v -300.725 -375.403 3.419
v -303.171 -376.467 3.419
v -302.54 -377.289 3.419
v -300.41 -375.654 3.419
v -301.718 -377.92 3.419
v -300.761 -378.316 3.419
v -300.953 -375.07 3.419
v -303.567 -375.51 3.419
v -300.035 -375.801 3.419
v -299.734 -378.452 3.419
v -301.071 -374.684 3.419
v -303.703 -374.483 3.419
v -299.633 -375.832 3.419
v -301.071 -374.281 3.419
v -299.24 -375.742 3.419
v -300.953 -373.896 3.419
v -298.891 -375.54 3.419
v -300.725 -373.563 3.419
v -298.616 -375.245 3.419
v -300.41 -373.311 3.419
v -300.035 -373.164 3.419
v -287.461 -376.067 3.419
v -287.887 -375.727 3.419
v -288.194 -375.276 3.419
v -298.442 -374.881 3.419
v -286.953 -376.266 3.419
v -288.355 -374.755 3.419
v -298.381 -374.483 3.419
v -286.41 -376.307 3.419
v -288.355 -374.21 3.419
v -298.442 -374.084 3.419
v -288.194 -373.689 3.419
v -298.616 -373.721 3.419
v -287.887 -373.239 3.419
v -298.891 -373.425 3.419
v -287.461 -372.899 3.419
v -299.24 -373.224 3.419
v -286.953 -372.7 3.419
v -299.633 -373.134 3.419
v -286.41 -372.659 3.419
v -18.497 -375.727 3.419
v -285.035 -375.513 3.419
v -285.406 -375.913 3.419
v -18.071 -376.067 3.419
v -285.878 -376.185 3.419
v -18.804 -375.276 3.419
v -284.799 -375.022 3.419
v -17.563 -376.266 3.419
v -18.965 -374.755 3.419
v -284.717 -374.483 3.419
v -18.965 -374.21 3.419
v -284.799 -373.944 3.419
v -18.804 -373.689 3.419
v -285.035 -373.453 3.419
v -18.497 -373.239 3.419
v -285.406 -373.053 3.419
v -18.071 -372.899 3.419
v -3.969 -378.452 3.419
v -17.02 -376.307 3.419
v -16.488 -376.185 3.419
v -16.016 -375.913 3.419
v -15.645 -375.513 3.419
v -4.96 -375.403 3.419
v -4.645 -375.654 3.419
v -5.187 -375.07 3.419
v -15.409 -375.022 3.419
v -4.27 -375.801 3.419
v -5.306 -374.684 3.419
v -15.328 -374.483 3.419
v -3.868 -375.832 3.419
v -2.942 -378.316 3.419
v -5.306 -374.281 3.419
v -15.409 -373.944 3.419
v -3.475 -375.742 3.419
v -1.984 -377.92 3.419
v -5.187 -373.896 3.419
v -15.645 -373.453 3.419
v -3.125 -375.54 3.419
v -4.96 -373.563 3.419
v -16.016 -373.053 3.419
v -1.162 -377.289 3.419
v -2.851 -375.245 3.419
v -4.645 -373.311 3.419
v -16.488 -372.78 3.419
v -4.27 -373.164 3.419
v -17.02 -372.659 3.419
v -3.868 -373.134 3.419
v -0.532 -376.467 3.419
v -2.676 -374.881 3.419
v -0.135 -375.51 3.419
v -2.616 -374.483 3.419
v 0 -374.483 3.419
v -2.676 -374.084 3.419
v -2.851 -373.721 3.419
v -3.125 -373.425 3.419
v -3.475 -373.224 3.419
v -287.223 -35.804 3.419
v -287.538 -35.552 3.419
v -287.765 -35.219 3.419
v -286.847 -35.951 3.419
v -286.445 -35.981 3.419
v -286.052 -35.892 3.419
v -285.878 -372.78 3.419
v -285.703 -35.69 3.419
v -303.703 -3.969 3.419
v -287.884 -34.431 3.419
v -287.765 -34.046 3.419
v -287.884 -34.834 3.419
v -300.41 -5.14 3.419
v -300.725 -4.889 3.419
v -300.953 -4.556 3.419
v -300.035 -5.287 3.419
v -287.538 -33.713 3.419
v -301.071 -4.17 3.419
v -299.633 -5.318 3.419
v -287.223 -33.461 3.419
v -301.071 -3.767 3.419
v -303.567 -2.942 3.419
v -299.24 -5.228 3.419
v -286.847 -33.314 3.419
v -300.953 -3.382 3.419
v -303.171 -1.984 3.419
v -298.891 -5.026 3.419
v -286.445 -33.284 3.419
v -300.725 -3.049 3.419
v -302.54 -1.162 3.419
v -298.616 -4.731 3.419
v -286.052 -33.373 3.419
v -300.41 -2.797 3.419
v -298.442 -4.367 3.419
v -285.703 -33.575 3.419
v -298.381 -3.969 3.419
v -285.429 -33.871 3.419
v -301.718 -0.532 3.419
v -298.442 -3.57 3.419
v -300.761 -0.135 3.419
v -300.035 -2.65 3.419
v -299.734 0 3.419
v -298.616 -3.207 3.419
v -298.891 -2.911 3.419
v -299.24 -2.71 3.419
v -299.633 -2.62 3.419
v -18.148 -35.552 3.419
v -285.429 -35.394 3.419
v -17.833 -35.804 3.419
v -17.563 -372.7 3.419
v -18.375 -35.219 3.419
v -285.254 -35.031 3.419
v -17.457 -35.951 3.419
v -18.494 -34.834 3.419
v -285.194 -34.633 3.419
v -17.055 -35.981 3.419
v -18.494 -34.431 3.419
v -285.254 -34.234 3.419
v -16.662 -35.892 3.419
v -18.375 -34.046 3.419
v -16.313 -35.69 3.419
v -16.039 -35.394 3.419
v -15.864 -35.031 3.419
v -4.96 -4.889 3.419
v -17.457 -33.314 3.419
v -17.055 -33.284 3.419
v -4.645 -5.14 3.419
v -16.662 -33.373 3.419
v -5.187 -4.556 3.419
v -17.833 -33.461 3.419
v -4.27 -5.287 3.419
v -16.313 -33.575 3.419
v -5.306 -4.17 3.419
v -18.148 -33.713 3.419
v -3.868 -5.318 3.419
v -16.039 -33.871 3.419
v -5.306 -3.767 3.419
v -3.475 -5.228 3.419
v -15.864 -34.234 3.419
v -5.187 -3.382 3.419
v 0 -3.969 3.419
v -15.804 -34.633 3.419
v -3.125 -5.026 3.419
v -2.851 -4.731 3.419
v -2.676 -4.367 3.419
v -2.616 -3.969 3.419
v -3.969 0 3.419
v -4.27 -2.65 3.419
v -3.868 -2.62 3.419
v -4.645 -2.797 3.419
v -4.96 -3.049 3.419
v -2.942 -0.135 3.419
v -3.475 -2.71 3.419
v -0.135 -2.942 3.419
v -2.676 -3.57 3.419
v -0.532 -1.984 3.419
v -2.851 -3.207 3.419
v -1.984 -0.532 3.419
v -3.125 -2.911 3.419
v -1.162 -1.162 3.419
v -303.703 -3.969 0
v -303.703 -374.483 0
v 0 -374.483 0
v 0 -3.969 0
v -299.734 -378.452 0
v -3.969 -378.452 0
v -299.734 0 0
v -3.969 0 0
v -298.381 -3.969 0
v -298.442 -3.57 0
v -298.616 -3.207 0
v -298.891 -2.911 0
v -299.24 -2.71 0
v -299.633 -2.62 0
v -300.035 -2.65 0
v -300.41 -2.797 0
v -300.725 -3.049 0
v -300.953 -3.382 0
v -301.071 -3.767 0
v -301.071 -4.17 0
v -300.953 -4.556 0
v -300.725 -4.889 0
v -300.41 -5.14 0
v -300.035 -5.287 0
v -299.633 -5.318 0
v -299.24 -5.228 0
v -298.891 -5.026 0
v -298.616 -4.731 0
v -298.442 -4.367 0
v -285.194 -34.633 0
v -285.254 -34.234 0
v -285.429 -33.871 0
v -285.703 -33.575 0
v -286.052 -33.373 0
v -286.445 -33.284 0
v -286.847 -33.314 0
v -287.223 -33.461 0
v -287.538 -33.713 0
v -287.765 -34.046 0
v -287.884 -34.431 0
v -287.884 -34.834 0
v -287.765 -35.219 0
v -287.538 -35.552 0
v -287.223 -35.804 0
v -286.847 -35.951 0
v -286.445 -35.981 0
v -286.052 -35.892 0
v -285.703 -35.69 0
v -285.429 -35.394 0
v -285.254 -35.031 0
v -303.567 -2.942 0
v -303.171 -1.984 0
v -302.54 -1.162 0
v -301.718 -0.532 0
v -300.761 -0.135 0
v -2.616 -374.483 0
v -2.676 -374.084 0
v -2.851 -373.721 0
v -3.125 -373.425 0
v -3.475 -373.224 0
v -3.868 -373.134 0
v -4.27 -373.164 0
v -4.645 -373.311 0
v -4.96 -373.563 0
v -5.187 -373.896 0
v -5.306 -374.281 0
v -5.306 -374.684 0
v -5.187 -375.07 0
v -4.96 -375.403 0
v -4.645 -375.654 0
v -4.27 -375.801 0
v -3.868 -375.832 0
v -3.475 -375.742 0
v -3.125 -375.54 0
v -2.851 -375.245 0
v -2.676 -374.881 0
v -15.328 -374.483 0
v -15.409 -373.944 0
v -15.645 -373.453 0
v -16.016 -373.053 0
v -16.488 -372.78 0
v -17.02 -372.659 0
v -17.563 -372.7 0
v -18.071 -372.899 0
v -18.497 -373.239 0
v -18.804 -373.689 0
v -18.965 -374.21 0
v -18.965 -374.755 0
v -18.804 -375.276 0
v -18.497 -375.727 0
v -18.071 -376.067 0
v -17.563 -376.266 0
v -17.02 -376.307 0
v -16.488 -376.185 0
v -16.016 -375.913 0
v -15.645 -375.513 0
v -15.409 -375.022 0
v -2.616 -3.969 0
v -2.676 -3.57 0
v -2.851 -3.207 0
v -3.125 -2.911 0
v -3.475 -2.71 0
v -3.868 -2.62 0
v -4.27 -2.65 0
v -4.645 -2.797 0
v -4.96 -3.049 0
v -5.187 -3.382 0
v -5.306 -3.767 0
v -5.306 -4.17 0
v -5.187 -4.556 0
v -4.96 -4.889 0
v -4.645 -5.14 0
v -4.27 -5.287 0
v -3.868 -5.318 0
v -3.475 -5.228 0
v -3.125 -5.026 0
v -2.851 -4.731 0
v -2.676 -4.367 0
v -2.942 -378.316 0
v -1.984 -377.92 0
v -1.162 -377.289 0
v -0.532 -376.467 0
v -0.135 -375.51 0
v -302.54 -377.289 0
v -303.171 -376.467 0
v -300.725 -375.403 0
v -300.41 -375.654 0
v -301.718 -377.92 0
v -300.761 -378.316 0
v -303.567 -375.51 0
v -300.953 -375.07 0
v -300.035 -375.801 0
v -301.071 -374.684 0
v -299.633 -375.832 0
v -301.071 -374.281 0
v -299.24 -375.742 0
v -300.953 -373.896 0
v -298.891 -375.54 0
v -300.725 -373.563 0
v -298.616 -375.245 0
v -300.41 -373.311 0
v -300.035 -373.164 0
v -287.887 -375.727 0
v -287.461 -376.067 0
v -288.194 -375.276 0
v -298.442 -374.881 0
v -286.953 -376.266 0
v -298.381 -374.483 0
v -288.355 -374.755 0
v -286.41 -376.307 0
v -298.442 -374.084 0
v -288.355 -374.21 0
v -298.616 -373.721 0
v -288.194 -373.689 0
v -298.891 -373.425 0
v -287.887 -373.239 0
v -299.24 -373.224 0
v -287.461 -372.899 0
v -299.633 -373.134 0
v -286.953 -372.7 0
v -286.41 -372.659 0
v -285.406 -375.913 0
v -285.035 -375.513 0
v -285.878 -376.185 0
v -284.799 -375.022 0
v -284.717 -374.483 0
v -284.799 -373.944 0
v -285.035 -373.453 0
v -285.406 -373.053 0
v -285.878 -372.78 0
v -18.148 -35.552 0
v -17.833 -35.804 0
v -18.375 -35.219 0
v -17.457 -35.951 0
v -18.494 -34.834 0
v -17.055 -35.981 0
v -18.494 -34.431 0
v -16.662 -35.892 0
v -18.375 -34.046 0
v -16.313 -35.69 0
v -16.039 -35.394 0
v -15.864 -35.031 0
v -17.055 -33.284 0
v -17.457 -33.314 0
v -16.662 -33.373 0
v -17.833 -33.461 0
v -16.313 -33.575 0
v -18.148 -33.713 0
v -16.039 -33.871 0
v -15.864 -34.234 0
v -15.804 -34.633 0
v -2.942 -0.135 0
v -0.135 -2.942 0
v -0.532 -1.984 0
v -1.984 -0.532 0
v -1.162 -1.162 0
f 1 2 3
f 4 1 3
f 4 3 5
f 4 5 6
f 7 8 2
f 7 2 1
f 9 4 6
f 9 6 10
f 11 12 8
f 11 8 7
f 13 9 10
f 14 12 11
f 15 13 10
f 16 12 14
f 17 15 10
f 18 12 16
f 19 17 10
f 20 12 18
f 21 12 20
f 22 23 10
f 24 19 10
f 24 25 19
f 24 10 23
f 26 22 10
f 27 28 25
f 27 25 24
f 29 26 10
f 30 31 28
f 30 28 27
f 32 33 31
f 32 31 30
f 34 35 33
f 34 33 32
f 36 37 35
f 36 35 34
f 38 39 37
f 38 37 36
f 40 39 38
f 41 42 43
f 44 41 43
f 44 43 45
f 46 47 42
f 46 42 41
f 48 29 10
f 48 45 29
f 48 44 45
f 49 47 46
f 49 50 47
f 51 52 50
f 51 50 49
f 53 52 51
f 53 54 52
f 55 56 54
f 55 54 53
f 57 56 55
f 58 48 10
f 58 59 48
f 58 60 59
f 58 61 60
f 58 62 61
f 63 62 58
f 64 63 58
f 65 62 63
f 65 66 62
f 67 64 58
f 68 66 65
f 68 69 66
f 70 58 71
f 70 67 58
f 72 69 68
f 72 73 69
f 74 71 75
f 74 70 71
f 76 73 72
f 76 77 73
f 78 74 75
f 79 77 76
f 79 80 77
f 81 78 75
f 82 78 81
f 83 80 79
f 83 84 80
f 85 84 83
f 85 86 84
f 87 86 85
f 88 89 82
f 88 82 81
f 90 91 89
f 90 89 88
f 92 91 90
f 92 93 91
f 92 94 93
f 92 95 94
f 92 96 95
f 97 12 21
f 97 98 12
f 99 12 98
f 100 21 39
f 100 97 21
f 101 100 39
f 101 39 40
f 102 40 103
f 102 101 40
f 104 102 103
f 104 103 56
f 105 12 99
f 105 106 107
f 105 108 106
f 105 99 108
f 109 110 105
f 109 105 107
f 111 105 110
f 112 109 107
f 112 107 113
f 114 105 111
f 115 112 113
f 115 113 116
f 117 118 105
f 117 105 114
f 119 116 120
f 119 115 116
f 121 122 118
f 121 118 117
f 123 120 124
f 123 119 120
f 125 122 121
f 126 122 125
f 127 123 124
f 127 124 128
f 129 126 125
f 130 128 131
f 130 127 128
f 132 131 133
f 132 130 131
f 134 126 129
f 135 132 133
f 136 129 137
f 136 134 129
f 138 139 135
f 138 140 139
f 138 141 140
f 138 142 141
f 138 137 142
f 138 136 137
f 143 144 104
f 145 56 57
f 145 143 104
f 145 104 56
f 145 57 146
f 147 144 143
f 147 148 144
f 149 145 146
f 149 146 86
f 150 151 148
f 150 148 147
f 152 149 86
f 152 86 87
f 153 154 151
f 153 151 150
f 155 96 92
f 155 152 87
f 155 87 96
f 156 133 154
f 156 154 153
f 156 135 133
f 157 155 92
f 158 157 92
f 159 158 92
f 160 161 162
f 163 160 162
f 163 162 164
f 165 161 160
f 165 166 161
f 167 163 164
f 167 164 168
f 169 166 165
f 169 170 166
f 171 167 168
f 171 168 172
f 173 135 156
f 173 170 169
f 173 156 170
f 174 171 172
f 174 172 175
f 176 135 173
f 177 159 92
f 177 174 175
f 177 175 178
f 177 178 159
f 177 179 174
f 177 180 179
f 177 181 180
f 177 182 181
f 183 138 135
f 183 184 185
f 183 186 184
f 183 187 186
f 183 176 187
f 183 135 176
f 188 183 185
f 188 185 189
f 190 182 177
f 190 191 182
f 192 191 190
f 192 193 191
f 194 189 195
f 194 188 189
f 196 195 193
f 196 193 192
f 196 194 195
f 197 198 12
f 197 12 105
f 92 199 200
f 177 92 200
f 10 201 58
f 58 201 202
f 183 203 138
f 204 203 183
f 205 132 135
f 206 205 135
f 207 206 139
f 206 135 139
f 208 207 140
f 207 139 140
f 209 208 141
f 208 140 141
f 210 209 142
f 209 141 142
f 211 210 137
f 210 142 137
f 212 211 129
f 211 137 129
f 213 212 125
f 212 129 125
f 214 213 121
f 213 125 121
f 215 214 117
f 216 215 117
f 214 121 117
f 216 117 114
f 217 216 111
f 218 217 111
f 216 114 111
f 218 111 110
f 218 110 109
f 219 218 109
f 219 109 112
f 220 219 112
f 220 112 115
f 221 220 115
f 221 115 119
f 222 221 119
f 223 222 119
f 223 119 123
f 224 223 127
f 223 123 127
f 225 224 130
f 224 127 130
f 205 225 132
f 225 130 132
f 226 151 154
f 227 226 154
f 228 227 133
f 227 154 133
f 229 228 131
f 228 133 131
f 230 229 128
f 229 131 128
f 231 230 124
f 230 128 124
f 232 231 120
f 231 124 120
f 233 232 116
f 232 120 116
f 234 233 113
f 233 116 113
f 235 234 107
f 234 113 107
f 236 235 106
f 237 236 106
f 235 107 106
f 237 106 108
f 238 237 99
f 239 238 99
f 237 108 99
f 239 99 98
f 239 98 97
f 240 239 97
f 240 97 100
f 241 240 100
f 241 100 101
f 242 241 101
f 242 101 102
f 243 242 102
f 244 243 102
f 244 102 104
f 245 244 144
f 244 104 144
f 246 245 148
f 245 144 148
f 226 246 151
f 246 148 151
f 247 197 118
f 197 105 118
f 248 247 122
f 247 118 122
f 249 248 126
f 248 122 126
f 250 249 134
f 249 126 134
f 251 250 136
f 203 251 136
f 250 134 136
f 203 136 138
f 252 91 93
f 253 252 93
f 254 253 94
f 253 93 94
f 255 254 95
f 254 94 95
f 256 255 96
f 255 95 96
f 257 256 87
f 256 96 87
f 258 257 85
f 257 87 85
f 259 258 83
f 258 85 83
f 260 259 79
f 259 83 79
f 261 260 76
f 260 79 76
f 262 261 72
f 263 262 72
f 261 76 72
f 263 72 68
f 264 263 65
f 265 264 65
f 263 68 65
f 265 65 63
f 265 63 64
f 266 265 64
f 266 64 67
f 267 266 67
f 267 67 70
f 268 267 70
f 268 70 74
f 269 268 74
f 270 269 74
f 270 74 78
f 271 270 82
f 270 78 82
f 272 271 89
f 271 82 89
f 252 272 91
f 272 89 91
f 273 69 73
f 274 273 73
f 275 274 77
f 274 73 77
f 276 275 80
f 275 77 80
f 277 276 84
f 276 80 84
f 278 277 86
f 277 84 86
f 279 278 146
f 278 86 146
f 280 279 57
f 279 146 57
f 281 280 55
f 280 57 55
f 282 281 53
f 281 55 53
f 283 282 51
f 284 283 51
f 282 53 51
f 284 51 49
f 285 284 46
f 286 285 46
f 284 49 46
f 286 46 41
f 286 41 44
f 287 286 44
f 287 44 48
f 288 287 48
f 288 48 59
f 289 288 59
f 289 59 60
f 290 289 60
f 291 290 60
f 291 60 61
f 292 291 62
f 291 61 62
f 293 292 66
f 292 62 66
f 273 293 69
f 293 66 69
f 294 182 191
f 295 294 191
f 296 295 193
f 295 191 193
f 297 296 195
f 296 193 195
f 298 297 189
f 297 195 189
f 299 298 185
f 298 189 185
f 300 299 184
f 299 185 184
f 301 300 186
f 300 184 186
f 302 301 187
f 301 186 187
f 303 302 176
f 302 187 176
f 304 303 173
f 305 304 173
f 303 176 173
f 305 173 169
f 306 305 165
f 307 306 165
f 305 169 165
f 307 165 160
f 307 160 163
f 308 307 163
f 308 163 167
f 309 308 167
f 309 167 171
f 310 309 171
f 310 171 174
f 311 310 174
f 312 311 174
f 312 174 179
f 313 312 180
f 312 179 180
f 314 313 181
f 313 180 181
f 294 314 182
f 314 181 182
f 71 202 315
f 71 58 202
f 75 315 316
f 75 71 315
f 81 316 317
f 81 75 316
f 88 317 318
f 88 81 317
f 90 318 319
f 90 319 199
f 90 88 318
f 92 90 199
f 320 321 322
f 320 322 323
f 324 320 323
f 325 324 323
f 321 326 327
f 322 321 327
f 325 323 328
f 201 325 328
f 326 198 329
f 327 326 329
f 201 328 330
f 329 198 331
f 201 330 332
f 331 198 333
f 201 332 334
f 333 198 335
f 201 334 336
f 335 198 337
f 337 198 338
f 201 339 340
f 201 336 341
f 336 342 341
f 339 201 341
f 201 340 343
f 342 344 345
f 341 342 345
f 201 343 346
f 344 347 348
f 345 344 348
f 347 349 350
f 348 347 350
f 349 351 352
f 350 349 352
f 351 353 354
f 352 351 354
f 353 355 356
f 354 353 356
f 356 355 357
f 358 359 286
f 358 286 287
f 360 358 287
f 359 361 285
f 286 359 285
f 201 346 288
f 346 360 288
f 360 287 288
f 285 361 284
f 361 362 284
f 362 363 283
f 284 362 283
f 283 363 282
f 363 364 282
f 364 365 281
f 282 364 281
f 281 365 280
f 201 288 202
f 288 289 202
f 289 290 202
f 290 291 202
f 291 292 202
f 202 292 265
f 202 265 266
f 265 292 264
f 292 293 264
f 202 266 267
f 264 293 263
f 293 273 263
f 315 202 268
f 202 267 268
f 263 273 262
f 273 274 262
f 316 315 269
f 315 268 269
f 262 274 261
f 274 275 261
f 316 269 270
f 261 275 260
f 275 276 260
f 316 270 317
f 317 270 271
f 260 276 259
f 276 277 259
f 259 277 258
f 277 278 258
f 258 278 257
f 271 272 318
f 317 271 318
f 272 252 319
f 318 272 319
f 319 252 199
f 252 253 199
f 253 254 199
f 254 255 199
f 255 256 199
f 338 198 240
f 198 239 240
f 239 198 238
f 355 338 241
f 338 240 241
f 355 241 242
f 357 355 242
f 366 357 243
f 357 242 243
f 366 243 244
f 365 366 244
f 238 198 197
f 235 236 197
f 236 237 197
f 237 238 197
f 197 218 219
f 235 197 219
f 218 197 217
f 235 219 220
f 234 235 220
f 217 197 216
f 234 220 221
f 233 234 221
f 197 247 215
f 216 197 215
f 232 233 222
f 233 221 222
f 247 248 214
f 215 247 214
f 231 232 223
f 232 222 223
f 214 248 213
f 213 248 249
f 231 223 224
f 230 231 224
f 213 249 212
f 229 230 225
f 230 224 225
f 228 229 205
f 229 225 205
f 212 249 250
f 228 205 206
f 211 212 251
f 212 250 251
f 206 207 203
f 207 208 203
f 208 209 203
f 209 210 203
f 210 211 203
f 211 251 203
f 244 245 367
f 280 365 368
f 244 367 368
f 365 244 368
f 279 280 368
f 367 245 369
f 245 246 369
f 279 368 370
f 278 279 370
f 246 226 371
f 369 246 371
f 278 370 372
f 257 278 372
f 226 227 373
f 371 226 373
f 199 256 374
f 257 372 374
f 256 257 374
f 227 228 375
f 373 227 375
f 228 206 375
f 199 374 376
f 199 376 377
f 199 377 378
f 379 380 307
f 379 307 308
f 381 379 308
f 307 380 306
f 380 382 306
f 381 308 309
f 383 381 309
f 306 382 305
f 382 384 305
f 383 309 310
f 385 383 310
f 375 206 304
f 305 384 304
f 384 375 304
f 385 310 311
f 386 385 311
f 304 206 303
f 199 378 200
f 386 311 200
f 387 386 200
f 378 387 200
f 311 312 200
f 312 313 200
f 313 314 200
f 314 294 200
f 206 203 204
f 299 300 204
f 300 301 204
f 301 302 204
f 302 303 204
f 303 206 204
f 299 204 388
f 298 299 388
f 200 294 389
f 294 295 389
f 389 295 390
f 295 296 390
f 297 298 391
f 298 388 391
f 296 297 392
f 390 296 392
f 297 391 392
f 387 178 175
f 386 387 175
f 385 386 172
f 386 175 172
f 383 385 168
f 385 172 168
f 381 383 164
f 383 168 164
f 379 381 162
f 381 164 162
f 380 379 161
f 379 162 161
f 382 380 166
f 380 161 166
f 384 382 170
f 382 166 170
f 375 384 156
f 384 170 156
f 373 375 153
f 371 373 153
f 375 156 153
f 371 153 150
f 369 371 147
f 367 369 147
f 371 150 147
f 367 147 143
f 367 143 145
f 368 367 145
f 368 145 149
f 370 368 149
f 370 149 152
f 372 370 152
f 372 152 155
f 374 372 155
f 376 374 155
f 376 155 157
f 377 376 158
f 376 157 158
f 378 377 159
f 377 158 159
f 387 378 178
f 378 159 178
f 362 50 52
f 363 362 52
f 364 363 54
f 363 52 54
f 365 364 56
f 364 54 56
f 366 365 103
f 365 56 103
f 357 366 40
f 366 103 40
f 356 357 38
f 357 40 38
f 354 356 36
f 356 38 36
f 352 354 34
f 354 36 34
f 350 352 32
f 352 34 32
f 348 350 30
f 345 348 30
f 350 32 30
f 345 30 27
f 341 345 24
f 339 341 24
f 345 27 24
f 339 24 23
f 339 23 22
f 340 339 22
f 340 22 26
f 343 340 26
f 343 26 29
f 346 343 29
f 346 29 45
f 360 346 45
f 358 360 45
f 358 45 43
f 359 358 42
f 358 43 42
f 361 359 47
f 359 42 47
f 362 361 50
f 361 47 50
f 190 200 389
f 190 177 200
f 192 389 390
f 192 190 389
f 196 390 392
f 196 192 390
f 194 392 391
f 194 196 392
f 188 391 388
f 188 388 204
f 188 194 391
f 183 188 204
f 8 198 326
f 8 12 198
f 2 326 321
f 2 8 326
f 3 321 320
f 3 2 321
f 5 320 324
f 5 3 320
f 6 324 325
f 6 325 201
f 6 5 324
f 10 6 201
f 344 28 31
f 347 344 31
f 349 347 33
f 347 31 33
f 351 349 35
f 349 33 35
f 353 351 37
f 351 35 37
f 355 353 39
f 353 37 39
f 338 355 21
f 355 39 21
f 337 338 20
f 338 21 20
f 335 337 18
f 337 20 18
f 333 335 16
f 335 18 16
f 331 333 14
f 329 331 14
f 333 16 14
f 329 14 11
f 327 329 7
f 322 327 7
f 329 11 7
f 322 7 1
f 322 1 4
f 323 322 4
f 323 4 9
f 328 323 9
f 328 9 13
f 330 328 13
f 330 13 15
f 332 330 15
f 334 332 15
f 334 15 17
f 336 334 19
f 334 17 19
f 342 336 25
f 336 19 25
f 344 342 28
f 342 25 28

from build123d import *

# Parameters (mm, degrees)
F0_W     = 303.70272
F0_H     = 378.451567
F1_DEPTH = 3.41884
F2_R     = 3.96875
F3_R     = 1.35255
F4_DEPTH = 3.41884
F5_R     = 1.8288
F6_DEPTH = 3.41884


with BuildPart() as f1:
    # F0 (on Top) → F1 (new body)
    with BuildSketch(Plane.XY):
        with Locations((-151.85136, -189.225783)):
            Rectangle(F0_W, F0_H)
    extrude(amount=F1_DEPTH)

    # F2
    f2_edges = [f1.edges().sort_by_distance(p)[0] for p in [
        (-303.70272, 0, 1.70942),
        (-303.70272, -378.451567, 1.70942),
        (0, -378.451567, 1.70942),
        (0, 0, 1.70942),
    ]]
    fillet(f2_edges, radius=F2_R)

    # F3 (on face) → F4 (cut, through all)
    with BuildSketch(Plane.XY.offset(3.41884)):
        with Locations((-299.73397, -3.96875)):
            Circle(F3_R)
        with Locations((-3.96875, -3.96875)):
            Circle(F3_R)
        with Locations((-299.73397, -374.482817)):
            Circle(F3_R)
        with Locations((-3.96875, -374.482817)):
            Circle(F3_R)
        with Locations((-286.54629, -34.632519)):
            Circle(F3_R)
        with Locations((-17.15643, -34.632519)):
            Circle(F3_R)
    extrude(amount=-F4_DEPTH, mode=Mode.SUBTRACT)

    # F5 (on face) → F6 (cut, through all)
    with BuildSketch(Plane.XY.offset(3.41884)):
        with Locations((-286.54629, -374.482817)):
            Circle(F5_R)
        with Locations((-17.15643, -374.482817)):
            Circle(F5_R)
    extrude(amount=-F6_DEPTH, mode=Mode.SUBTRACT)


solid = f1.part
